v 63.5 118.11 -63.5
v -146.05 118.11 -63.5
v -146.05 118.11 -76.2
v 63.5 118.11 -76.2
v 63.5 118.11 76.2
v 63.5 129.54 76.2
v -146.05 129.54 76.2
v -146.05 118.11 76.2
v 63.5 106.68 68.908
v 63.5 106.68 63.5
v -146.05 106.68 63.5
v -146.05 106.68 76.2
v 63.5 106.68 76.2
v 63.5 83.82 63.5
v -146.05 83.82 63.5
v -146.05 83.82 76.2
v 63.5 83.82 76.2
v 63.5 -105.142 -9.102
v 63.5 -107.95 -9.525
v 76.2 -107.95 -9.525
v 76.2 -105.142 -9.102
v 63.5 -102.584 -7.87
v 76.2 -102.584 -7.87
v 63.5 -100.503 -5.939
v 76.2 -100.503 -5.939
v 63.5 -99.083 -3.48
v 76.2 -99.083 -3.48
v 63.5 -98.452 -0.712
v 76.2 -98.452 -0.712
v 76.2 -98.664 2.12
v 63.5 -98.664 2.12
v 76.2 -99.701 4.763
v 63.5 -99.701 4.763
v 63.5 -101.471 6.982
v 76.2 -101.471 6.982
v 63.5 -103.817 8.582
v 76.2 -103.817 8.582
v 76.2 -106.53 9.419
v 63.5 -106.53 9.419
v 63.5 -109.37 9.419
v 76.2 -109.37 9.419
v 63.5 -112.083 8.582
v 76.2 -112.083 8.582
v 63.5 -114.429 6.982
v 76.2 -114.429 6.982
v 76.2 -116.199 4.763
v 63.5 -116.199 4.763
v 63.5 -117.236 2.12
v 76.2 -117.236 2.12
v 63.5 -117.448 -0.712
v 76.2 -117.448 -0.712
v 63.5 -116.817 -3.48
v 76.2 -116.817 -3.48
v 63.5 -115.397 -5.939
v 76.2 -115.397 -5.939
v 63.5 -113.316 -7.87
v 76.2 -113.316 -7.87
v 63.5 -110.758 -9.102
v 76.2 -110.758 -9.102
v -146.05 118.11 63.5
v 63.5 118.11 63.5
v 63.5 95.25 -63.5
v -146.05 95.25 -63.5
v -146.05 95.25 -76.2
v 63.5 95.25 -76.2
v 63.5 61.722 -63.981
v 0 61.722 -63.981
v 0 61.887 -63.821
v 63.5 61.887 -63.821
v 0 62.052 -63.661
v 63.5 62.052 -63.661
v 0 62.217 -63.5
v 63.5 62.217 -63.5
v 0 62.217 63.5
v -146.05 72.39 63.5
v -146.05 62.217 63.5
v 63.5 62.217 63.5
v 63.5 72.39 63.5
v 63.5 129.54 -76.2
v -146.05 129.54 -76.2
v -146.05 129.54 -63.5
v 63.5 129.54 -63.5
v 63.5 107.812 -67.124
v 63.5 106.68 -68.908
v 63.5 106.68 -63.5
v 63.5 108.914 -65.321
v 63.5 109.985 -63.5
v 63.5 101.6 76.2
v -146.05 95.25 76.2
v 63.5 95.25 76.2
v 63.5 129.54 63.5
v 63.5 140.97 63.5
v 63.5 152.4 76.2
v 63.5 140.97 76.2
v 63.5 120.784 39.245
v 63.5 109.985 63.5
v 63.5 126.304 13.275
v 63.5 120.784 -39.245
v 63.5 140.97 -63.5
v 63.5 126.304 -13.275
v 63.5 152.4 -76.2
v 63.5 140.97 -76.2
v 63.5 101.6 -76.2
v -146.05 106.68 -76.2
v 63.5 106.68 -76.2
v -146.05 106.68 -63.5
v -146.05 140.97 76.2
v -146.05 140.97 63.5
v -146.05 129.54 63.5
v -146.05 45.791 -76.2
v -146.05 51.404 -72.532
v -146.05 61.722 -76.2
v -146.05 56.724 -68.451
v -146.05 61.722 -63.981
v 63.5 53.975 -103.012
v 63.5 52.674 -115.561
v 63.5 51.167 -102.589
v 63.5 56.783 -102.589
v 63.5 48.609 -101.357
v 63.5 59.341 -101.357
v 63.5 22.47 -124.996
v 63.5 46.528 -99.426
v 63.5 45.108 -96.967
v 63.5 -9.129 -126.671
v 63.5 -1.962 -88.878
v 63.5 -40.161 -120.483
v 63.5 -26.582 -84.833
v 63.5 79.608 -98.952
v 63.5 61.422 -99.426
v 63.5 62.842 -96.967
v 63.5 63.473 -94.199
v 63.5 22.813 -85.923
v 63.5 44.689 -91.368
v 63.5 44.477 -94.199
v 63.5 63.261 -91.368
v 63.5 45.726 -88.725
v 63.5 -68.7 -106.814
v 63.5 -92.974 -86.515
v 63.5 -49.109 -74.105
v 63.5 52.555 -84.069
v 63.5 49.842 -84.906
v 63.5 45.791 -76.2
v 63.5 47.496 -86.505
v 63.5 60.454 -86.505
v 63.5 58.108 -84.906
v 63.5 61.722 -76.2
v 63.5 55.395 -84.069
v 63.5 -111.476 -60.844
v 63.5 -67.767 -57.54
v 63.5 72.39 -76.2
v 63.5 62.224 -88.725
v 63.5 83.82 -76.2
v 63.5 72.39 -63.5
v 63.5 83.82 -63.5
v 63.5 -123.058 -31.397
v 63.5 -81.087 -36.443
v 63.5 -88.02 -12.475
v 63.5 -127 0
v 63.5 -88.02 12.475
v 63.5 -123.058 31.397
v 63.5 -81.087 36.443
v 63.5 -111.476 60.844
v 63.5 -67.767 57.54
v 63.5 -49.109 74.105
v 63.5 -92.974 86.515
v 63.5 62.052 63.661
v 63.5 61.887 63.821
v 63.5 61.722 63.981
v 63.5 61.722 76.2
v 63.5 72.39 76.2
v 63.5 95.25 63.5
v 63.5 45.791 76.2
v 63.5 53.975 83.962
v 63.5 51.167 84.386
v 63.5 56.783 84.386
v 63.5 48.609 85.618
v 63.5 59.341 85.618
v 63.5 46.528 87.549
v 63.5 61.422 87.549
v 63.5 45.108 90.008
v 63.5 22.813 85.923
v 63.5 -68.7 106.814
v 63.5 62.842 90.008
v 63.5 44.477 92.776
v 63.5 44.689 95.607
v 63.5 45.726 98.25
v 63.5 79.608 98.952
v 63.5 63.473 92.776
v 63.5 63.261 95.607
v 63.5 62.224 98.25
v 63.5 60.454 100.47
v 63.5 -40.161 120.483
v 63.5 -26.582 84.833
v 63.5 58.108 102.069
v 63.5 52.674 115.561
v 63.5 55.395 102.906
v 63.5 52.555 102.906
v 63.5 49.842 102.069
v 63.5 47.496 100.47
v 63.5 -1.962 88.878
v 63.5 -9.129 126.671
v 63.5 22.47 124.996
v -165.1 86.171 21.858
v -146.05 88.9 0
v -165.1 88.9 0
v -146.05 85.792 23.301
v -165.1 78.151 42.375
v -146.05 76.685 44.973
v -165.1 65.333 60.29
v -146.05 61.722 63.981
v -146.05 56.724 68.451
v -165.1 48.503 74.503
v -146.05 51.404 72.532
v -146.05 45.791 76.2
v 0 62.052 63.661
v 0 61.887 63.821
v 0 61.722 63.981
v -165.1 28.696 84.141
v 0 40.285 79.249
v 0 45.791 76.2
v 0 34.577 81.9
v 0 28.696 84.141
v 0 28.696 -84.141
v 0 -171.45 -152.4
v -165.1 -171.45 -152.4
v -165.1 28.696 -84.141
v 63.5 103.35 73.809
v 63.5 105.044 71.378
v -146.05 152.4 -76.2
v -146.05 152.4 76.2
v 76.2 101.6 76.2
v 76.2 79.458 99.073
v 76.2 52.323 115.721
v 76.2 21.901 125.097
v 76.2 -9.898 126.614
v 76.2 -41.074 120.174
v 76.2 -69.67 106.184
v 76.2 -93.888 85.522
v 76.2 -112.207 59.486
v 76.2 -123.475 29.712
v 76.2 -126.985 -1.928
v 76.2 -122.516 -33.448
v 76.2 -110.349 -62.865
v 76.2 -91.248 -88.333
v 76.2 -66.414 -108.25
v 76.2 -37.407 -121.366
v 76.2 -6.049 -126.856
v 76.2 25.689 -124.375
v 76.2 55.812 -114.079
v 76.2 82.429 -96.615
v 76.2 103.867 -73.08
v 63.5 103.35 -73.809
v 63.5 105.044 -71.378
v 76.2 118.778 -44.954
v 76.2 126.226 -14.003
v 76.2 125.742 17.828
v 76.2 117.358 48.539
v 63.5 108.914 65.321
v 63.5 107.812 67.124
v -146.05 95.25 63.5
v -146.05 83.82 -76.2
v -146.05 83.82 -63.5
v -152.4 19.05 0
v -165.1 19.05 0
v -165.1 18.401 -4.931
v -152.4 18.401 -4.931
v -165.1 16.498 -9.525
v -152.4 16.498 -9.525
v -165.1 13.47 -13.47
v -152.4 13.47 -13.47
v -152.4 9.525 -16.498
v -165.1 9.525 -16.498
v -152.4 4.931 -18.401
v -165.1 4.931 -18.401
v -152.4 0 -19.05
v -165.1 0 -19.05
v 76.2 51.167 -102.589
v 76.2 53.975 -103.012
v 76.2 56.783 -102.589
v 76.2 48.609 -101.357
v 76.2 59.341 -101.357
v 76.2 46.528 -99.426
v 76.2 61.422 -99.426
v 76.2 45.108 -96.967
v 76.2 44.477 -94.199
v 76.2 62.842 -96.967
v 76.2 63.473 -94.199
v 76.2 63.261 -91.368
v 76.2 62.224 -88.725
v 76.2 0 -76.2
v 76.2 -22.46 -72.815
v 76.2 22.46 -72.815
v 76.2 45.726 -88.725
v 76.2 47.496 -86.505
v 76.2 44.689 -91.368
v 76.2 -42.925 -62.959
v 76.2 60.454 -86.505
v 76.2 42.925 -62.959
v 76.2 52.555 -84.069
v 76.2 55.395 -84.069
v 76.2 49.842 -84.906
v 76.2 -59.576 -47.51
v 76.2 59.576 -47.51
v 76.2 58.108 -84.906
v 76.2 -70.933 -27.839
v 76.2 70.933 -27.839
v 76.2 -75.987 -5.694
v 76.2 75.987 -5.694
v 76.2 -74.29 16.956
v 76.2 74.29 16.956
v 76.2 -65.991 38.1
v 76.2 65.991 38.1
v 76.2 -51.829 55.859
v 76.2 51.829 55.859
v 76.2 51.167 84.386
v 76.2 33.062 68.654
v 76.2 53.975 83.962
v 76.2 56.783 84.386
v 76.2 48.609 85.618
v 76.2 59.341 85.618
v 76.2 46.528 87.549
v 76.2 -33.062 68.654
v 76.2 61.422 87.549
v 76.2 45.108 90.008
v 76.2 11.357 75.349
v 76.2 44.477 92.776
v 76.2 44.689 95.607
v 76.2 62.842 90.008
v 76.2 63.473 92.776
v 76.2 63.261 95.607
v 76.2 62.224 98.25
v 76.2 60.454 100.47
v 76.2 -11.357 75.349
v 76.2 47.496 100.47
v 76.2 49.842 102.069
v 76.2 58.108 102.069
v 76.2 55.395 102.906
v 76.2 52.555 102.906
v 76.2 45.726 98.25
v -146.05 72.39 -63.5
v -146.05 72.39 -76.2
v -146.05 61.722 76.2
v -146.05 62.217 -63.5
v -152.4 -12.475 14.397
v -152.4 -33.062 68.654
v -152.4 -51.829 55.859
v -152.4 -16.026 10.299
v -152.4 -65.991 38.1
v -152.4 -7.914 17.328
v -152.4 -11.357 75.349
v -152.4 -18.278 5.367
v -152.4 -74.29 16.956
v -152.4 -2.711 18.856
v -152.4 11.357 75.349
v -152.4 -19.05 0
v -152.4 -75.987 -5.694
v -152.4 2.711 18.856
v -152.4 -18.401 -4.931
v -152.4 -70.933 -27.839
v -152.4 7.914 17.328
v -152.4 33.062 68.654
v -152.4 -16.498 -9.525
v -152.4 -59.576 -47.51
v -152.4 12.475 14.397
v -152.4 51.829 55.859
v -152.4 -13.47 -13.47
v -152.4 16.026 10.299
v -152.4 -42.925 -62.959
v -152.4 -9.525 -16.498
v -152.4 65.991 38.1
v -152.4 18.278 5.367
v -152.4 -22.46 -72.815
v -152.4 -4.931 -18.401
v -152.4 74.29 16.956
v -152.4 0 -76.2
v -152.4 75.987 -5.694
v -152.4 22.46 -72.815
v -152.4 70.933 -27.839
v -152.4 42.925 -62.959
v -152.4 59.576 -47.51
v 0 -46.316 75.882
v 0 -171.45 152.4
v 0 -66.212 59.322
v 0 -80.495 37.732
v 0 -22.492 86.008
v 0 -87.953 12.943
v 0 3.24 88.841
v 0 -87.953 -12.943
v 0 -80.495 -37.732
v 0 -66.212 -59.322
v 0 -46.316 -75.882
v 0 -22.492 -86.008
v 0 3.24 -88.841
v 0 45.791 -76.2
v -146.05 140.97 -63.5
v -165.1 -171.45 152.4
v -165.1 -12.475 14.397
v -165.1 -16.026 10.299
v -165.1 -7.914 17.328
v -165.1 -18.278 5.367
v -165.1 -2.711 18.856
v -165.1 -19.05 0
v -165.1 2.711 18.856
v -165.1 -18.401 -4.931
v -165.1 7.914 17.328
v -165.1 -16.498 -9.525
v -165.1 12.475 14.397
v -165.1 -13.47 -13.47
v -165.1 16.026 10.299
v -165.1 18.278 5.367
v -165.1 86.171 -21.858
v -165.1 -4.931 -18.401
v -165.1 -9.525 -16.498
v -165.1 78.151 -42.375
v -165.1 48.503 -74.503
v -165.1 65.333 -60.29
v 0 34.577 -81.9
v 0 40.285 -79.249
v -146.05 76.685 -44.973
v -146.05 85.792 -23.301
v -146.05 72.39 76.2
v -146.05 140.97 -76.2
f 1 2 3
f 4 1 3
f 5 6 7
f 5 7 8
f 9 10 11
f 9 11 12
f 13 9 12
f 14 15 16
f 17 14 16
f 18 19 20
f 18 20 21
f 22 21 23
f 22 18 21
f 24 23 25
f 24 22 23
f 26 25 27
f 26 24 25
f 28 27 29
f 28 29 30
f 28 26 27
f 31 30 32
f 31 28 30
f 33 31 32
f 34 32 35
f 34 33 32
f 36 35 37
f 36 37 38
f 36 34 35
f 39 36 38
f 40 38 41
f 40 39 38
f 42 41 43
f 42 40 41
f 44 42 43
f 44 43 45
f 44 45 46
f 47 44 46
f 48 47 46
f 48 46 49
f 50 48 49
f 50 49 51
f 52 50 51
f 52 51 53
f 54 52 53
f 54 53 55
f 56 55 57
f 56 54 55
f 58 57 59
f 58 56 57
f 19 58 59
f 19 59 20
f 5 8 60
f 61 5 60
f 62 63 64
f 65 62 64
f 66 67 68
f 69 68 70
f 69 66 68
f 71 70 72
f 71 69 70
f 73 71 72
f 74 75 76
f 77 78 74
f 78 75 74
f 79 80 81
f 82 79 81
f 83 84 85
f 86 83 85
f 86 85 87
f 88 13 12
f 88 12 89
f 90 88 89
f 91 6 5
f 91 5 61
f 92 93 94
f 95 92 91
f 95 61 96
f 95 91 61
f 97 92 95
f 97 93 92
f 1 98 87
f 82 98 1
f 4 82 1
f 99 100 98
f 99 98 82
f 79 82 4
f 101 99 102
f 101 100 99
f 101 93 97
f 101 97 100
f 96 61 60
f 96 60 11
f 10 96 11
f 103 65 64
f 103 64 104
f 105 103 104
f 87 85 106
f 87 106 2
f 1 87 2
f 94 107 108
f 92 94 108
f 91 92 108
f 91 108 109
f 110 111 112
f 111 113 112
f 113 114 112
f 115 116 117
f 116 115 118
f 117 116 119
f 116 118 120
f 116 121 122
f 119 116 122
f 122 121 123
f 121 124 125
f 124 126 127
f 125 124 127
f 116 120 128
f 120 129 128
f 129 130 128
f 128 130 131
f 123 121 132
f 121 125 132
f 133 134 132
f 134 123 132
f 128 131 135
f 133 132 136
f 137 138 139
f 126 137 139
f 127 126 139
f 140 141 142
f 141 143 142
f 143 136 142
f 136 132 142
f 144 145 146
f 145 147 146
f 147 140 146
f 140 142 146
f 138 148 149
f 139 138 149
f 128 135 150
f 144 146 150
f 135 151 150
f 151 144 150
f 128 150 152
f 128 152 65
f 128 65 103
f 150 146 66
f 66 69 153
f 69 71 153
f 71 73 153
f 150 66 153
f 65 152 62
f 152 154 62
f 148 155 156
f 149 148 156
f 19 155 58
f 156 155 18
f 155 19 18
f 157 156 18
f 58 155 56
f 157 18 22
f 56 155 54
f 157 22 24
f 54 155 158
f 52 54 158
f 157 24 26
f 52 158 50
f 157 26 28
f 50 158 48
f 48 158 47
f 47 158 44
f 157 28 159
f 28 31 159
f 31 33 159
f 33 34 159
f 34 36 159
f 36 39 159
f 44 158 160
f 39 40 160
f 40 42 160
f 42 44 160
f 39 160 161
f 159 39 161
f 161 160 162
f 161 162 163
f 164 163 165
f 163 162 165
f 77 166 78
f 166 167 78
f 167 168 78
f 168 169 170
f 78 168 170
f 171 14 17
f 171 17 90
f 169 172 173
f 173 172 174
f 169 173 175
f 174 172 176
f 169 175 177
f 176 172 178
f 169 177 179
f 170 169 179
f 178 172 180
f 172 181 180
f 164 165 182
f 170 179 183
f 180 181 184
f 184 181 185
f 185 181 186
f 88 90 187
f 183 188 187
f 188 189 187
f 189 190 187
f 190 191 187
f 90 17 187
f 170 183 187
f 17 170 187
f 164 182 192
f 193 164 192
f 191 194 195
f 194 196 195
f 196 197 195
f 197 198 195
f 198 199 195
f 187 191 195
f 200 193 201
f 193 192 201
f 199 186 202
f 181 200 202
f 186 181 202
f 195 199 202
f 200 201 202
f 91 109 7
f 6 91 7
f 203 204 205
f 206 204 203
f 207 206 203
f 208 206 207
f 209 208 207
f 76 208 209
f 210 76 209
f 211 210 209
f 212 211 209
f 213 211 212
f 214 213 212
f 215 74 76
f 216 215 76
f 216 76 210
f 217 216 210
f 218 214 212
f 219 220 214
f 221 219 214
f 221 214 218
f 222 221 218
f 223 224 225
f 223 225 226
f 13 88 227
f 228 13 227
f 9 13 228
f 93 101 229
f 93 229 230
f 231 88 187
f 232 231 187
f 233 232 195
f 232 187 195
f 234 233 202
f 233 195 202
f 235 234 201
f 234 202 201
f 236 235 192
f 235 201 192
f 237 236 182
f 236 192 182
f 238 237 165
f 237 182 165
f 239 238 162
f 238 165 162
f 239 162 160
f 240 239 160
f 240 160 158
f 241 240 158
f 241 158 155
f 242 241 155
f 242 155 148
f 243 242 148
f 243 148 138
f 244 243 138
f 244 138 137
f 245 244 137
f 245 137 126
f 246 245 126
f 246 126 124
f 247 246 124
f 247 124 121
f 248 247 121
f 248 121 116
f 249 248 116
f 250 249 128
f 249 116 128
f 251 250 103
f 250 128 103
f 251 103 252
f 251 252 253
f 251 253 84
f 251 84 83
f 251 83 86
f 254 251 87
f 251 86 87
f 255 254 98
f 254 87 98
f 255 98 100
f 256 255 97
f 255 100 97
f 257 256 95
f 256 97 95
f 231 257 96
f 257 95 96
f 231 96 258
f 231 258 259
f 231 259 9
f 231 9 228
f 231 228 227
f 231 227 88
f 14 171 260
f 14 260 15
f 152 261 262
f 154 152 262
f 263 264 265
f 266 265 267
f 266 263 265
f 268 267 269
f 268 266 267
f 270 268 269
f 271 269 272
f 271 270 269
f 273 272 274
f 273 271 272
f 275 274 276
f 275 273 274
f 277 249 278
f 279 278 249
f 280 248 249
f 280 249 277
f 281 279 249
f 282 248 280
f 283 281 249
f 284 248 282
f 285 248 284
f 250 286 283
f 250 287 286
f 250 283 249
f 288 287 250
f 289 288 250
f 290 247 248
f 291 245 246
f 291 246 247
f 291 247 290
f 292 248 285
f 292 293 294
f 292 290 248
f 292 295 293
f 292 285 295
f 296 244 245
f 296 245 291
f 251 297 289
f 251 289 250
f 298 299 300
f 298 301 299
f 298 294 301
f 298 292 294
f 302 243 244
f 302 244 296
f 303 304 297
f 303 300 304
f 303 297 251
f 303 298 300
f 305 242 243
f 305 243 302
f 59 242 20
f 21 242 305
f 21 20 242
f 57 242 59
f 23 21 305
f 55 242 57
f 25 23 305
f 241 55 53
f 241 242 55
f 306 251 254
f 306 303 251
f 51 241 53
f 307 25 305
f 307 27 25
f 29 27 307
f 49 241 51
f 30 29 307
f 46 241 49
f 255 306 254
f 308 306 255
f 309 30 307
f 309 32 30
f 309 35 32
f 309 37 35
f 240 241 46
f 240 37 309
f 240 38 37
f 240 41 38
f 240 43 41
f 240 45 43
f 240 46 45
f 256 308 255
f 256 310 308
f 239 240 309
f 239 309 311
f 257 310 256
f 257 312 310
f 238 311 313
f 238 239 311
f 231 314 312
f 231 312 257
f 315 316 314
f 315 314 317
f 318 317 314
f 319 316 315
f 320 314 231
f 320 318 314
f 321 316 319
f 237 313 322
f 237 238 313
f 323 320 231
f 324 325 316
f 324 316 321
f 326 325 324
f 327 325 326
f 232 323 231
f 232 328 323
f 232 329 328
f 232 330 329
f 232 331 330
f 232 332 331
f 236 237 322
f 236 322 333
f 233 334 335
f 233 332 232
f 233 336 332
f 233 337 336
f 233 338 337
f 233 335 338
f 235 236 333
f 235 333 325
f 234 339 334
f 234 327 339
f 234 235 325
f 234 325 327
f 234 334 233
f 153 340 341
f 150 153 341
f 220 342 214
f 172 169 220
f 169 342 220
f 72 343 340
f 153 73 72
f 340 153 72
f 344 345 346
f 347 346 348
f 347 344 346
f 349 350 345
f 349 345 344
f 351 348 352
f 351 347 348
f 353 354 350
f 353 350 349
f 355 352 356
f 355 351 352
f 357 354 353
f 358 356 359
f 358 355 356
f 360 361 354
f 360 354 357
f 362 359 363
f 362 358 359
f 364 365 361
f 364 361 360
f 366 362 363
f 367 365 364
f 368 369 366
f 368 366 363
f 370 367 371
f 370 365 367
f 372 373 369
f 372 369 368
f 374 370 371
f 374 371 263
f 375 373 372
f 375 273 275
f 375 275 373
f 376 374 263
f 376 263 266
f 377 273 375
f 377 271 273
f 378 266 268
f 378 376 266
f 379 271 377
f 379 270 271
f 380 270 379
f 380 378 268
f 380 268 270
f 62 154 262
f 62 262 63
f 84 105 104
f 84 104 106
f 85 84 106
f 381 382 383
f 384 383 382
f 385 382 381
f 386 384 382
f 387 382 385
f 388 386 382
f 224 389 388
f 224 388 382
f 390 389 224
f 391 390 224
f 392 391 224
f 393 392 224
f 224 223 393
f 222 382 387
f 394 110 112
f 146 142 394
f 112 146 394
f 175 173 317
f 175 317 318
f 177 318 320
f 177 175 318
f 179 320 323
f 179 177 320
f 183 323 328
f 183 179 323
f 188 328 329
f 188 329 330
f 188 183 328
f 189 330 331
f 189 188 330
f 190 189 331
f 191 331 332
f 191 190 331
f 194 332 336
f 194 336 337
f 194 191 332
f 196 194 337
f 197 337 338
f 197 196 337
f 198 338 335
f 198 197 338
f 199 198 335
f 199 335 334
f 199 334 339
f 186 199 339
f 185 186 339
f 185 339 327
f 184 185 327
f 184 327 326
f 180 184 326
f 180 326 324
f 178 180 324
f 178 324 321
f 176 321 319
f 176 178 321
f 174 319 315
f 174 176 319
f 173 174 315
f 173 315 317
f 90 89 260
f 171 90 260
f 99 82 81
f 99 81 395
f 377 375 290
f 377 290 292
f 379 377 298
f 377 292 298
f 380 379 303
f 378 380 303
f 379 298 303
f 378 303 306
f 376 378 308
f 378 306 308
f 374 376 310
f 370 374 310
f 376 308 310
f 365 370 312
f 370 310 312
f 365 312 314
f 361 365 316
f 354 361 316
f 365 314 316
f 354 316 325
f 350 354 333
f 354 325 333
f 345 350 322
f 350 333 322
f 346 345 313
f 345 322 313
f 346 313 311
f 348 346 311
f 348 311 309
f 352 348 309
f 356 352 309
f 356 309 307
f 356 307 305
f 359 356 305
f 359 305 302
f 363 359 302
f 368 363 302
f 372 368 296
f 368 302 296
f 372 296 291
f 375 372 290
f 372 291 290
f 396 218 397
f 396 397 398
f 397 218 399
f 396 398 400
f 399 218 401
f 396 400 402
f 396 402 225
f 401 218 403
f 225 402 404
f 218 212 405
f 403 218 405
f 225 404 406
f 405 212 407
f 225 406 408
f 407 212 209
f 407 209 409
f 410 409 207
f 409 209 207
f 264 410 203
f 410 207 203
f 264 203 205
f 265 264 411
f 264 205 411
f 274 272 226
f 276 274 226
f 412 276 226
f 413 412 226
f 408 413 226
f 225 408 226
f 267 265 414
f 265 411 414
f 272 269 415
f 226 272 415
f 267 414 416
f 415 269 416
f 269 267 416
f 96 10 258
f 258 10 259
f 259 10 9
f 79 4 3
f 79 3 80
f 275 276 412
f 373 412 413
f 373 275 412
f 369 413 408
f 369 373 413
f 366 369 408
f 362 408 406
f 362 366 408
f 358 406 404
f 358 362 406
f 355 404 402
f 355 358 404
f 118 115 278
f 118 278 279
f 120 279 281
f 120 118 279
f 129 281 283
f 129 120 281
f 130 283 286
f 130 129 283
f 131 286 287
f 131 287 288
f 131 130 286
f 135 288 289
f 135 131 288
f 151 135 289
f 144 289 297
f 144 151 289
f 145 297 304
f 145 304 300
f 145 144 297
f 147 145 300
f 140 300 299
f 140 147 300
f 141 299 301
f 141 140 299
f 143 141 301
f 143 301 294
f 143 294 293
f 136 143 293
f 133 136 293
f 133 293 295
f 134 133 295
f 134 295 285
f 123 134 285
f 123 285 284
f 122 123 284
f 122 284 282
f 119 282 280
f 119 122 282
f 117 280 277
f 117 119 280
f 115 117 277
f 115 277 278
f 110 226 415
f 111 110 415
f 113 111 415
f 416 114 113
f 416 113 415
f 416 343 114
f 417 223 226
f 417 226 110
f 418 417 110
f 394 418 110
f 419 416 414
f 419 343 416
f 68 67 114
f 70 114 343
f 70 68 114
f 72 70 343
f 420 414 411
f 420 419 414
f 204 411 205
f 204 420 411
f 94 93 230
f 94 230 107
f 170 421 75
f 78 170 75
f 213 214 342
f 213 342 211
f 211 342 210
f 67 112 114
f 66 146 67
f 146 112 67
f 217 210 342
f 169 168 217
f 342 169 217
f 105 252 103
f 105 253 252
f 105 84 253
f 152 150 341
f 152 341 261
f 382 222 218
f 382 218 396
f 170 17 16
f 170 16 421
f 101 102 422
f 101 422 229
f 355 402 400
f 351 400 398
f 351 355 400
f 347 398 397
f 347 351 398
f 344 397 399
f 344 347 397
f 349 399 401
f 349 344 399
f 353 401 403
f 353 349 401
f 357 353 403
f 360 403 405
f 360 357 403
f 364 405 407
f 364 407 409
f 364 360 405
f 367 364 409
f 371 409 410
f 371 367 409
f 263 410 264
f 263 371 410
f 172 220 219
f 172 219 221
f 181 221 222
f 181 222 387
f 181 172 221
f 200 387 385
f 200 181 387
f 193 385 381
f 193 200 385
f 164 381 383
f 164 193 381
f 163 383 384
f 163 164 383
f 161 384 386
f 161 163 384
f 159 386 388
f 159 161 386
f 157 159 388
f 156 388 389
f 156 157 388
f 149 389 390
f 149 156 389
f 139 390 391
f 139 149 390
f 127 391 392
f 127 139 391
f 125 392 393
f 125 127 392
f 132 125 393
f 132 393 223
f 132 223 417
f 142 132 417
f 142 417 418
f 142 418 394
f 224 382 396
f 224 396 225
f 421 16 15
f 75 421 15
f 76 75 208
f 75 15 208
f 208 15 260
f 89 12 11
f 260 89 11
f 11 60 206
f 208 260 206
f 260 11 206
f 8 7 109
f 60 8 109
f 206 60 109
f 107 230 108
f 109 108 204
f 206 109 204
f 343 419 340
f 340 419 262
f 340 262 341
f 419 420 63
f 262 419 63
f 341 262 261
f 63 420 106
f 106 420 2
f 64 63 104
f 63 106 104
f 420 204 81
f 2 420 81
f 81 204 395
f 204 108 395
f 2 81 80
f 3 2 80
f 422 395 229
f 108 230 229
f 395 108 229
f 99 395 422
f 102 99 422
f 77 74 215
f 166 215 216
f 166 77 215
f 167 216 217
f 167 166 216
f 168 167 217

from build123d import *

# Parameters (mm, degrees)
BOSS_EXTRUDE1_DEPTH = 165.1
BOSS_EXTRUDE2_START = 63.5
SKETCH3_R           = 88.9
SKETCH3_R_2         = 16.51
BOSS_EXTRUDE2_DEPTH = 63.5
BOSS_EXTRUDE3_START = 63.5
BOSS_EXTRUDE3_DEPTH = 209.55
SKETCH7_R           = 127
SKETCH7_R_2         = 9.525
BOSS_EXTRUDE4_DEPTH = 12.7
SKETCH8_R           = 76.2
CUT_EXTRUDE1_DEPTH  = 228.6


with BuildPart() as part:
    # Sketch2 → Boss-Extrude1 (new body)
    with BuildSketch(Plane(origin=(0, 0, 0), x_dir=(0, 0, -1), z_dir=(1, 0, 0))):
        with BuildLine():
            Line((-84.14126771, 28.695941668), (-152.4, -171.45))
            Line((-152.4, -171.45), (0, -171.45))
            Line((0, -171.45), (0, -88.9))
            ThreePointArc((0, -88.9), (-72.298959931, -51.730749007), (-84.14126771, 28.695941668))
        make_face()
        with BuildLine():
            Line((0, -88.9), (0, -171.45))
            Line((0, -171.45), (152.4, -171.45))
            Line((152.4, -171.45), (84.14126771, 28.695941668))
            ThreePointArc((84.14126771, 28.695941668), (87.702248259, 14.543921421), (88.9, 0))
            ThreePointArc((88.9, 0), (62.861792847, -62.861792847), (0, -88.9))
        make_face()
        with BuildLine():
            ThreePointArc((0, 88.9), (-51.730749007, 72.298959931), (-84.14126771, 28.695941668))
            ThreePointArc((-84.14126771, 28.695941668), (-72.298959931, -51.730749007), (0, -88.9))
            Line((0, -88.9), (0, -19.05))
            ThreePointArc((0, -19.05), (-19.05, 0), (0, 19.05))
            Line((0, 19.05), (0, 88.9))
        make_face()
        with BuildLine():
            Line((0, -19.05), (0, -88.9))
            ThreePointArc((0, -88.9), (62.861792847, -62.861792847), (88.9, 0))
            ThreePointArc((88.9, 0), (87.702248259, 14.543921421), (84.14126771, 28.695941668))
            ThreePointArc((84.14126771, 28.695941668), (51.730749007, 72.298959931), (0, 88.9))
            Line((0, 88.9), (0, 19.05))
            ThreePointArc((0, 19.05), (13.470384182, 13.470384182), (19.05, 0))
            ThreePointArc((19.05, 0), (13.470384182, -13.470384182), (0, -19.05))
        make_face()
    extrude(amount=-BOSS_EXTRUDE1_DEPTH)

    # Sketch3 → Boss-Extrude2 (add)
    with BuildSketch(Plane(origin=(0, 0, 0), x_dir=(0, 0, -1), z_dir=(1, 0, 0)).offset(BOSS_EXTRUDE2_START)):
        Circle(SKETCH3_R)
        Circle(SKETCH3_R_2, mode=Mode.SUBTRACT)
    extrude(amount=-BOSS_EXTRUDE2_DEPTH)

    # Sketch6 → Boss-Extrude3 (add)
    with BuildSketch(Plane(origin=(0, 0, 0), x_dir=(0, 0, -1), z_dir=(1, 0, 0)).offset(BOSS_EXTRUDE3_START)):
        Polygon((76.2, 152.4), (-76.2, 152.4), (-76.2, 140.97), (-63.5, 140.97), (-63.5, 129.54), (-76.2, 129.54), (-76.2, 118.11), (-63.5, 118.11), (-63.5, 106.68), (-76.2, 106.68), (-76.2, 95.25), (-63.5, 95.25), (-63.5, 83.82), (-76.2, 83.82), (-76.2, 72.39), (-63.5, 72.39), (-63.5, 61.722), (-76.2, 61.722), (-76.2, 0), (76.2, 0), (76.2, 61.722), (63.5, 61.722), (63.5, 72.39), (76.2, 72.39), (76.2, 83.82), (63.5, 83.82), (63.5, 95.25), (76.2, 95.25), (76.2, 106.68), (63.5, 106.68), (63.5, 118.11), (76.2, 118.11), (76.2, 129.54), (63.5, 129.54), (63.5, 140.97), (76.2, 140.97), align=None)
    extrude(amount=-BOSS_EXTRUDE3_DEPTH)

    # Sketch7 → Boss-Extrude4 (add)
    with BuildSketch(Plane(origin=(63.5, 0, 0), x_dir=(0, 0, -1), z_dir=(1, 0, 0))):
        with Locations(Location((0, 0, 0), (0, 0, 126.869897646))):
            Circle(SKETCH7_R)
        with Locations((0, -107.95)):
            Circle(SKETCH7_R_2, mode=Mode.SUBTRACT)
        with Locations((-93.487442339, 53.975)):
            Circle(SKETCH7_R_2, mode=Mode.SUBTRACT)
        with Locations((93.487442339, 53.975)):
            Circle(SKETCH7_R_2, mode=Mode.SUBTRACT)
    extrude(amount=BOSS_EXTRUDE4_DEPTH)

    # Sketch8 → Cut-Extrude1 (cut)
    with BuildSketch(Plane(origin=(76.2, 0, 0), x_dir=(0, 0, -1), z_dir=(1, 0, 0))):
        Circle(SKETCH8_R)
    extrude(amount=-CUT_EXTRUDE1_DEPTH, mode=Mode.SUBTRACT)


solid = part.part
